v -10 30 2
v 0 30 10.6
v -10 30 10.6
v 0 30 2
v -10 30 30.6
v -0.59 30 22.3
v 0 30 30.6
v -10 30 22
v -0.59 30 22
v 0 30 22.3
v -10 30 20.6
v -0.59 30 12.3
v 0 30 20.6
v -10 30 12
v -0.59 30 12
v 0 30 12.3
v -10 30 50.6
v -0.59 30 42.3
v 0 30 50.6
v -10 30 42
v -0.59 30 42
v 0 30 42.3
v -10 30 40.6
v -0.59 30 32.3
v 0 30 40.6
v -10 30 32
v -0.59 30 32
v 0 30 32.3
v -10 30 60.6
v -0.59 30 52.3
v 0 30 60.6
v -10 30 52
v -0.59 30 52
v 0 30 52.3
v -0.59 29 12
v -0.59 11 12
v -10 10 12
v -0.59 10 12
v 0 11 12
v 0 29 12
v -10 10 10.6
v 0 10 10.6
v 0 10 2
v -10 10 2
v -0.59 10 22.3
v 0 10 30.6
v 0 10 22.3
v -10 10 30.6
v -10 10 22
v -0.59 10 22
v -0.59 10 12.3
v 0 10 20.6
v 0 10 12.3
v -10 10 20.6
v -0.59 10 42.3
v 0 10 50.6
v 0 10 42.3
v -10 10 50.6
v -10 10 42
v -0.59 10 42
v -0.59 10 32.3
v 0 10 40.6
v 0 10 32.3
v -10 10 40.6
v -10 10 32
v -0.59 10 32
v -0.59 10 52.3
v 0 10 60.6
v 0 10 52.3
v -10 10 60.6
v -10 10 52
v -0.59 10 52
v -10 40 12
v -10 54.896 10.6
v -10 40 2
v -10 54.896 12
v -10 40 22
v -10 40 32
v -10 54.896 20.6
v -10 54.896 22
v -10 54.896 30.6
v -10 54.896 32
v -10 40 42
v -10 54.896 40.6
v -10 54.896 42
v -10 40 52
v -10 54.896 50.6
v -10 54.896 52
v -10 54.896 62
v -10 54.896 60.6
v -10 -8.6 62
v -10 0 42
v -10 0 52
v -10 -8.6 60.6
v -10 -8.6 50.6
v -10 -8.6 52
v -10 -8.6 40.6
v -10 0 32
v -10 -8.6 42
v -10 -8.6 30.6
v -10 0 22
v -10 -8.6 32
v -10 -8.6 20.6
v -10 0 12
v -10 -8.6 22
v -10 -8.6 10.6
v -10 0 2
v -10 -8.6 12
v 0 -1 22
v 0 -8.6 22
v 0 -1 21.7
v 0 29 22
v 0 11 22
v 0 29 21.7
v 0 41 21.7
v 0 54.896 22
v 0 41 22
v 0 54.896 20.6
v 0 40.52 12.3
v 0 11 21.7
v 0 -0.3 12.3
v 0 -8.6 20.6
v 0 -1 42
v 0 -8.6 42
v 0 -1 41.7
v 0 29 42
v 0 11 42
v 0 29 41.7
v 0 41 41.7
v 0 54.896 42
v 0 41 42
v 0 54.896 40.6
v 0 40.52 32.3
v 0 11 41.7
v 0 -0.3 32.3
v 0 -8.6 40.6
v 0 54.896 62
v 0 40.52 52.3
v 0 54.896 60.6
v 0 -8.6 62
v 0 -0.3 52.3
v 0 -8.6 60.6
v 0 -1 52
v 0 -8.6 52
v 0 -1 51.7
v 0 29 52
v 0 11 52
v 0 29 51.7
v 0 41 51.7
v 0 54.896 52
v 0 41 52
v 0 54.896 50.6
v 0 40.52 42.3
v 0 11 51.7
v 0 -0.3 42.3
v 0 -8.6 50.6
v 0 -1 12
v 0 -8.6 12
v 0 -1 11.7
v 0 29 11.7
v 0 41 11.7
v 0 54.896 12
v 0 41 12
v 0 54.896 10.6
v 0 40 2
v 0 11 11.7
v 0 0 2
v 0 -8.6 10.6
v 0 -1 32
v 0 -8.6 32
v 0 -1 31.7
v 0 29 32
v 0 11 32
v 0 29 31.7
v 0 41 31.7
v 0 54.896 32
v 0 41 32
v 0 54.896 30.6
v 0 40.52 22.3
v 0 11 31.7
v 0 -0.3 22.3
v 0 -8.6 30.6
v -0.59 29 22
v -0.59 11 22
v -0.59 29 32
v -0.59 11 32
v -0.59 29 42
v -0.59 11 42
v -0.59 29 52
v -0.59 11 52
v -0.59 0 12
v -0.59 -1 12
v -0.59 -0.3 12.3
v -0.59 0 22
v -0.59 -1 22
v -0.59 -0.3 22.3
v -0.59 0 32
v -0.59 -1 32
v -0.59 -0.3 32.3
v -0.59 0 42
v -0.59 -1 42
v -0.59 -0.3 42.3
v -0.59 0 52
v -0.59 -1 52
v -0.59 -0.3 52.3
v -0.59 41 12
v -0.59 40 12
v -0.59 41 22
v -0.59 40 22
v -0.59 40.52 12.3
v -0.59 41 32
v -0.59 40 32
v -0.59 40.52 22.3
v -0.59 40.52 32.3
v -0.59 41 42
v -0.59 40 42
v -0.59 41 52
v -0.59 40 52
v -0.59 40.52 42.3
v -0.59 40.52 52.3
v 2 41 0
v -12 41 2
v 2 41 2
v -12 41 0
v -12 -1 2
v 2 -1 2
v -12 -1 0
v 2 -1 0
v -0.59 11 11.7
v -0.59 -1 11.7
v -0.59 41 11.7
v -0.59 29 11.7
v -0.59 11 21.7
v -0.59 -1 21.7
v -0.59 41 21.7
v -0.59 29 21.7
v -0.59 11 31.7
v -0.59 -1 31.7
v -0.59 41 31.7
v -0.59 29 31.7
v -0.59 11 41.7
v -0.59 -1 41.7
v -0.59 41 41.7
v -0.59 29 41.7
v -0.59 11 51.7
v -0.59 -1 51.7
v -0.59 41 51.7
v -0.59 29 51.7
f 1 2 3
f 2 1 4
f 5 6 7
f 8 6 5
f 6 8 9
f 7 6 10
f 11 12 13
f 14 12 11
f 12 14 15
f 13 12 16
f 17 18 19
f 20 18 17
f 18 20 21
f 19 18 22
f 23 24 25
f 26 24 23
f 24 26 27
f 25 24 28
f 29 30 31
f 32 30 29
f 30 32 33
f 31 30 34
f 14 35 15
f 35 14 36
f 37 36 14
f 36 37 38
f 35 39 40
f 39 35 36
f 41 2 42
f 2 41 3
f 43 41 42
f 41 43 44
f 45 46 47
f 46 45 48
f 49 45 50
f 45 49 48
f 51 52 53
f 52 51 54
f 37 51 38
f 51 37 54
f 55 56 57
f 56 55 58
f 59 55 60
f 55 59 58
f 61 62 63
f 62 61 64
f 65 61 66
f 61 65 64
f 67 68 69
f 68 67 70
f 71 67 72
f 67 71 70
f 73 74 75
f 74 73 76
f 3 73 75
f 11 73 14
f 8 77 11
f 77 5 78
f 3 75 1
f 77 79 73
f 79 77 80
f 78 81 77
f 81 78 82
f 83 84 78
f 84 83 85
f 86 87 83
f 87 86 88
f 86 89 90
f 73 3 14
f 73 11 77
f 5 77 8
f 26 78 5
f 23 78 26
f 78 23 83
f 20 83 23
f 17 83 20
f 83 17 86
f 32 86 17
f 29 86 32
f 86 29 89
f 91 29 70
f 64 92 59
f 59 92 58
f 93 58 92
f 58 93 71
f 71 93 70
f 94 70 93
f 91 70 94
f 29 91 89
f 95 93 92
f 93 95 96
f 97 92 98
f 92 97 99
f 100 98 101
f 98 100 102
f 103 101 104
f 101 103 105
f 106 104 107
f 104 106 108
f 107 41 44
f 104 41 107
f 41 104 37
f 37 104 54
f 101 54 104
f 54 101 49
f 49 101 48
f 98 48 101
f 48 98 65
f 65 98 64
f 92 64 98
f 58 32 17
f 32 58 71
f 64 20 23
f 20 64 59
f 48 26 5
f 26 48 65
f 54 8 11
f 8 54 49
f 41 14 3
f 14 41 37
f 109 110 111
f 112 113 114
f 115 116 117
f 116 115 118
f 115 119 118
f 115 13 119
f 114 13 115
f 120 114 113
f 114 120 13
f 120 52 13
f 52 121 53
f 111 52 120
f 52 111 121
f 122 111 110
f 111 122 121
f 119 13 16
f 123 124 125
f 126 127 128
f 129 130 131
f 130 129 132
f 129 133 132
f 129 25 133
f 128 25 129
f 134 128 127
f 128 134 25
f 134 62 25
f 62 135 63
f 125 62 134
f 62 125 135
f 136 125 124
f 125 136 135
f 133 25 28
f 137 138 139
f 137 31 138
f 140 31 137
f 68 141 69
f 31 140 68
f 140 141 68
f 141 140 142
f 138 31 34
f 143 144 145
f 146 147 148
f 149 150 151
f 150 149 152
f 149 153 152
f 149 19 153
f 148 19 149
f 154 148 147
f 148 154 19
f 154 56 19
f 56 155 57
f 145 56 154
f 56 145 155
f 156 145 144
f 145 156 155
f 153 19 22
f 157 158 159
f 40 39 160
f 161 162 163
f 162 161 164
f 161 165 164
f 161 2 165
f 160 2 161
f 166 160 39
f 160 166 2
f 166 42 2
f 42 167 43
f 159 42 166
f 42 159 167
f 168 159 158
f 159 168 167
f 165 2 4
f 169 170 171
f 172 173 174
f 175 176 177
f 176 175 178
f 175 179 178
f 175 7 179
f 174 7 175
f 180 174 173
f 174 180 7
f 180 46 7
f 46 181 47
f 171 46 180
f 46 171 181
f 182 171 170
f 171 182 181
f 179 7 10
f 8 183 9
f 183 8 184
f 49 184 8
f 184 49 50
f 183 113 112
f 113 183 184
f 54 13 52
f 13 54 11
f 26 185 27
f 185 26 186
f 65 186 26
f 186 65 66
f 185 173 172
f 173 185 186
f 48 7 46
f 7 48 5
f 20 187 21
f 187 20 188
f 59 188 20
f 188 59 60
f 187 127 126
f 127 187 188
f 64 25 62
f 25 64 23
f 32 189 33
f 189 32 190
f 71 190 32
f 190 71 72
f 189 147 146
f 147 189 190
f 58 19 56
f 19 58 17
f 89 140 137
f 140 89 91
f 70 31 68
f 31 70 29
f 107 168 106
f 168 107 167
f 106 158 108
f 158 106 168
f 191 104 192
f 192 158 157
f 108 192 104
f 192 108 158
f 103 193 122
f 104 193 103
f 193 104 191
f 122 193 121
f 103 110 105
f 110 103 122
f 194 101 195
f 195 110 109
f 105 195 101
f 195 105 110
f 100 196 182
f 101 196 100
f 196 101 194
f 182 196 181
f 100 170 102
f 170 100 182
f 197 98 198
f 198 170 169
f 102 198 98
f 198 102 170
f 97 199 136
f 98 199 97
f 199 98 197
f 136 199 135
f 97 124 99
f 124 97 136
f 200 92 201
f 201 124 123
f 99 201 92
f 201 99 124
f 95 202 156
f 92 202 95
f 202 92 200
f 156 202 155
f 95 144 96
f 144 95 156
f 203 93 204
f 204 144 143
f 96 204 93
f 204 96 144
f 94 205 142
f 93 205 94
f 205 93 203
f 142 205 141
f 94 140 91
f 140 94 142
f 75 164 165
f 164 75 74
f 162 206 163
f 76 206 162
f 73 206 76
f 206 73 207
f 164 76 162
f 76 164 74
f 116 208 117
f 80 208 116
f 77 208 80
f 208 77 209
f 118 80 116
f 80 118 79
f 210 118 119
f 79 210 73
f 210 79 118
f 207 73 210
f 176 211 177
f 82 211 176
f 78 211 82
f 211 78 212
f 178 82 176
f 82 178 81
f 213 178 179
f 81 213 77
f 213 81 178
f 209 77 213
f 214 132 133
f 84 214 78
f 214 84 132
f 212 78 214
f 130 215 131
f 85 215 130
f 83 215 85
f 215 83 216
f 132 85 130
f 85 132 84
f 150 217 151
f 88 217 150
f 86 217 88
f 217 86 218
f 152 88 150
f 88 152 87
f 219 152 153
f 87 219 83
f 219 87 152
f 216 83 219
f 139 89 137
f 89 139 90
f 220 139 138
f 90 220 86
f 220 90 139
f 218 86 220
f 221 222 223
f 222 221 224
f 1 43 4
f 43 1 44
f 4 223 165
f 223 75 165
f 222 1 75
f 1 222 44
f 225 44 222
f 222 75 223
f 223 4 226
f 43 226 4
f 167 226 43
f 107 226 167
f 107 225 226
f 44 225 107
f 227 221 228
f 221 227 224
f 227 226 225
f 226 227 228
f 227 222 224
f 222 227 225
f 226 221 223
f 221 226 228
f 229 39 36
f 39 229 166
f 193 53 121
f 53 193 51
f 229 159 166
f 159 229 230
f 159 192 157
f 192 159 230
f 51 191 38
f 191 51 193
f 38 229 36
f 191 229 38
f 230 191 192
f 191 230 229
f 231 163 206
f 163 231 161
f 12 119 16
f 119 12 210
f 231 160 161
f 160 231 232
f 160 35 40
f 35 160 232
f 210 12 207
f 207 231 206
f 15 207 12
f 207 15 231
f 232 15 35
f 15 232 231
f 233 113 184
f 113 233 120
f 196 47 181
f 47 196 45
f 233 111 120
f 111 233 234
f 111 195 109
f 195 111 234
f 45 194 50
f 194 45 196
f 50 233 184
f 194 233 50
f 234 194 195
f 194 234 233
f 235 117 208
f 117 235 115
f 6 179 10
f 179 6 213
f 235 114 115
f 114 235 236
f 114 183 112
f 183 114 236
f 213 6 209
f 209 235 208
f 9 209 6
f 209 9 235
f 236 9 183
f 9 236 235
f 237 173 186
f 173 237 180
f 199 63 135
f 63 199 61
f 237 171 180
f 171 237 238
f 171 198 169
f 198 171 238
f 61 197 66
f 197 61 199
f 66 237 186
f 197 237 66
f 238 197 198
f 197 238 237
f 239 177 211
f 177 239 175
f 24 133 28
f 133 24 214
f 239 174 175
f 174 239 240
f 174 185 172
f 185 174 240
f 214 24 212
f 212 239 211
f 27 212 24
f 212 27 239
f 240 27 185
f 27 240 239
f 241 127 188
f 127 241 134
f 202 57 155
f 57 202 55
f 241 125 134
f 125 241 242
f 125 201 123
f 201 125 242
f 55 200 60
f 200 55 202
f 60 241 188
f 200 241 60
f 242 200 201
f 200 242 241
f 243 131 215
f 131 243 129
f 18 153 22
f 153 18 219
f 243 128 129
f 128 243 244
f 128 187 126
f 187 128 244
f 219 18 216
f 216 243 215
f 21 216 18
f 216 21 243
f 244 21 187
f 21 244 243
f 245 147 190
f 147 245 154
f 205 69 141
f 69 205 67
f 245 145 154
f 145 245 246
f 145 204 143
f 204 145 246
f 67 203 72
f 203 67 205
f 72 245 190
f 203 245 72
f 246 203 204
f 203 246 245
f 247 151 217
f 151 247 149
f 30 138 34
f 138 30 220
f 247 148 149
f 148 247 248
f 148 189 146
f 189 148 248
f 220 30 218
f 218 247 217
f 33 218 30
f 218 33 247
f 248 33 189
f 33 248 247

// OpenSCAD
// Калибровка обдува: две детали на одном столе, обдув меняется полосами по 10 мм (переписывается в G-code, build.py).
//   tower — две колонны: мост 20 мм между ними и уступы 45° и 60° на внешних гранях, в каждой полосе заново;
//           насечки на передней грани колонны — границы полос.
//   tube  — плоская трубка в две стенки для излома руками; рёбра на границах полос (излом приходится внутрь полосы).
// Длинная сторона обеих деталей идёт вдоль Y — по ходу стола A1 mini.

part = "tower";   // ["tower", "tube"]
plinth = 2;       // основание, печатается с выключенным обдувом первых слоёв
band = 10;
bands = 6;
H = plinth + band * bands;

gap = 20;         // пролёт моста
col = 10;         // колонна 10 × 10
bridge_t = 1.4;   // мост у верха каждой полосы
ledge_h = 8.6;    // высота наклонной части уступа, выше — полка 1.4 мм

module ledge(angle, side) {   // side -1: наружу от левой колонны, +1: от правой
    w = ledge_h * tan(angle);
    x0 = side < 0 ? 0 : 2 * col + gap;
    for (k = [0 : bands - 1]) {
        z0 = plinth + k * band;
        translate([x0, 0, 0]) rotate([90, 0, 0]) translate([0, 0, -col])
            linear_extrude(col) polygon([[0, z0], [0, z0 + band], [side * w, z0 + band], [side * w, z0 + ledge_h]]);
    }
}

module tower() {
    difference() {
        union() {
            translate([-1, -2, 0]) cube([2 * col + gap + 2, col + 4, plinth]);
            cube([col, col, H]);
            translate([col + gap, 0, 0]) cube([col, col, H]);
            for (k = [0 : bands - 1])
                translate([col, 0, plinth + k * band + band - bridge_t]) cube([gap, col, bridge_t]);
            ledge(45, -1);
            ledge(60, 1);
        }
        for (k = [1 : bands - 1], x = [0, col + gap])   // насечки 0.6 × 0.6 на передней грани (y = 0)
            translate([x - 1, -0.01, plinth + k * band - 0.3]) cube([col + 2, 0.6, 0.6]);
    }
}

tube_l = 24; tube_w = 6; tube_wall = 0.85; rib = 0.6;
module tube() {
    difference() {
        union() {
            translate([-tube_l / 2, -tube_w / 2, 0]) cube([tube_l, tube_w, H]);
            for (k = [1 : bands - 1])
                translate([-tube_l / 2 - rib, -tube_w / 2 - rib, plinth + k * band - 0.3]) cube([tube_l + 2 * rib, tube_w + 2 * rib, 0.6]);
        }
        translate([-tube_l / 2 + tube_wall, -tube_w / 2 + tube_wall, plinth]) cube([tube_l - 2 * tube_wall, tube_w - 2 * tube_wall, H]);
    }
}

rotate([0, 0, 90]) { if (part == "tower") tower(); else tube(); }
